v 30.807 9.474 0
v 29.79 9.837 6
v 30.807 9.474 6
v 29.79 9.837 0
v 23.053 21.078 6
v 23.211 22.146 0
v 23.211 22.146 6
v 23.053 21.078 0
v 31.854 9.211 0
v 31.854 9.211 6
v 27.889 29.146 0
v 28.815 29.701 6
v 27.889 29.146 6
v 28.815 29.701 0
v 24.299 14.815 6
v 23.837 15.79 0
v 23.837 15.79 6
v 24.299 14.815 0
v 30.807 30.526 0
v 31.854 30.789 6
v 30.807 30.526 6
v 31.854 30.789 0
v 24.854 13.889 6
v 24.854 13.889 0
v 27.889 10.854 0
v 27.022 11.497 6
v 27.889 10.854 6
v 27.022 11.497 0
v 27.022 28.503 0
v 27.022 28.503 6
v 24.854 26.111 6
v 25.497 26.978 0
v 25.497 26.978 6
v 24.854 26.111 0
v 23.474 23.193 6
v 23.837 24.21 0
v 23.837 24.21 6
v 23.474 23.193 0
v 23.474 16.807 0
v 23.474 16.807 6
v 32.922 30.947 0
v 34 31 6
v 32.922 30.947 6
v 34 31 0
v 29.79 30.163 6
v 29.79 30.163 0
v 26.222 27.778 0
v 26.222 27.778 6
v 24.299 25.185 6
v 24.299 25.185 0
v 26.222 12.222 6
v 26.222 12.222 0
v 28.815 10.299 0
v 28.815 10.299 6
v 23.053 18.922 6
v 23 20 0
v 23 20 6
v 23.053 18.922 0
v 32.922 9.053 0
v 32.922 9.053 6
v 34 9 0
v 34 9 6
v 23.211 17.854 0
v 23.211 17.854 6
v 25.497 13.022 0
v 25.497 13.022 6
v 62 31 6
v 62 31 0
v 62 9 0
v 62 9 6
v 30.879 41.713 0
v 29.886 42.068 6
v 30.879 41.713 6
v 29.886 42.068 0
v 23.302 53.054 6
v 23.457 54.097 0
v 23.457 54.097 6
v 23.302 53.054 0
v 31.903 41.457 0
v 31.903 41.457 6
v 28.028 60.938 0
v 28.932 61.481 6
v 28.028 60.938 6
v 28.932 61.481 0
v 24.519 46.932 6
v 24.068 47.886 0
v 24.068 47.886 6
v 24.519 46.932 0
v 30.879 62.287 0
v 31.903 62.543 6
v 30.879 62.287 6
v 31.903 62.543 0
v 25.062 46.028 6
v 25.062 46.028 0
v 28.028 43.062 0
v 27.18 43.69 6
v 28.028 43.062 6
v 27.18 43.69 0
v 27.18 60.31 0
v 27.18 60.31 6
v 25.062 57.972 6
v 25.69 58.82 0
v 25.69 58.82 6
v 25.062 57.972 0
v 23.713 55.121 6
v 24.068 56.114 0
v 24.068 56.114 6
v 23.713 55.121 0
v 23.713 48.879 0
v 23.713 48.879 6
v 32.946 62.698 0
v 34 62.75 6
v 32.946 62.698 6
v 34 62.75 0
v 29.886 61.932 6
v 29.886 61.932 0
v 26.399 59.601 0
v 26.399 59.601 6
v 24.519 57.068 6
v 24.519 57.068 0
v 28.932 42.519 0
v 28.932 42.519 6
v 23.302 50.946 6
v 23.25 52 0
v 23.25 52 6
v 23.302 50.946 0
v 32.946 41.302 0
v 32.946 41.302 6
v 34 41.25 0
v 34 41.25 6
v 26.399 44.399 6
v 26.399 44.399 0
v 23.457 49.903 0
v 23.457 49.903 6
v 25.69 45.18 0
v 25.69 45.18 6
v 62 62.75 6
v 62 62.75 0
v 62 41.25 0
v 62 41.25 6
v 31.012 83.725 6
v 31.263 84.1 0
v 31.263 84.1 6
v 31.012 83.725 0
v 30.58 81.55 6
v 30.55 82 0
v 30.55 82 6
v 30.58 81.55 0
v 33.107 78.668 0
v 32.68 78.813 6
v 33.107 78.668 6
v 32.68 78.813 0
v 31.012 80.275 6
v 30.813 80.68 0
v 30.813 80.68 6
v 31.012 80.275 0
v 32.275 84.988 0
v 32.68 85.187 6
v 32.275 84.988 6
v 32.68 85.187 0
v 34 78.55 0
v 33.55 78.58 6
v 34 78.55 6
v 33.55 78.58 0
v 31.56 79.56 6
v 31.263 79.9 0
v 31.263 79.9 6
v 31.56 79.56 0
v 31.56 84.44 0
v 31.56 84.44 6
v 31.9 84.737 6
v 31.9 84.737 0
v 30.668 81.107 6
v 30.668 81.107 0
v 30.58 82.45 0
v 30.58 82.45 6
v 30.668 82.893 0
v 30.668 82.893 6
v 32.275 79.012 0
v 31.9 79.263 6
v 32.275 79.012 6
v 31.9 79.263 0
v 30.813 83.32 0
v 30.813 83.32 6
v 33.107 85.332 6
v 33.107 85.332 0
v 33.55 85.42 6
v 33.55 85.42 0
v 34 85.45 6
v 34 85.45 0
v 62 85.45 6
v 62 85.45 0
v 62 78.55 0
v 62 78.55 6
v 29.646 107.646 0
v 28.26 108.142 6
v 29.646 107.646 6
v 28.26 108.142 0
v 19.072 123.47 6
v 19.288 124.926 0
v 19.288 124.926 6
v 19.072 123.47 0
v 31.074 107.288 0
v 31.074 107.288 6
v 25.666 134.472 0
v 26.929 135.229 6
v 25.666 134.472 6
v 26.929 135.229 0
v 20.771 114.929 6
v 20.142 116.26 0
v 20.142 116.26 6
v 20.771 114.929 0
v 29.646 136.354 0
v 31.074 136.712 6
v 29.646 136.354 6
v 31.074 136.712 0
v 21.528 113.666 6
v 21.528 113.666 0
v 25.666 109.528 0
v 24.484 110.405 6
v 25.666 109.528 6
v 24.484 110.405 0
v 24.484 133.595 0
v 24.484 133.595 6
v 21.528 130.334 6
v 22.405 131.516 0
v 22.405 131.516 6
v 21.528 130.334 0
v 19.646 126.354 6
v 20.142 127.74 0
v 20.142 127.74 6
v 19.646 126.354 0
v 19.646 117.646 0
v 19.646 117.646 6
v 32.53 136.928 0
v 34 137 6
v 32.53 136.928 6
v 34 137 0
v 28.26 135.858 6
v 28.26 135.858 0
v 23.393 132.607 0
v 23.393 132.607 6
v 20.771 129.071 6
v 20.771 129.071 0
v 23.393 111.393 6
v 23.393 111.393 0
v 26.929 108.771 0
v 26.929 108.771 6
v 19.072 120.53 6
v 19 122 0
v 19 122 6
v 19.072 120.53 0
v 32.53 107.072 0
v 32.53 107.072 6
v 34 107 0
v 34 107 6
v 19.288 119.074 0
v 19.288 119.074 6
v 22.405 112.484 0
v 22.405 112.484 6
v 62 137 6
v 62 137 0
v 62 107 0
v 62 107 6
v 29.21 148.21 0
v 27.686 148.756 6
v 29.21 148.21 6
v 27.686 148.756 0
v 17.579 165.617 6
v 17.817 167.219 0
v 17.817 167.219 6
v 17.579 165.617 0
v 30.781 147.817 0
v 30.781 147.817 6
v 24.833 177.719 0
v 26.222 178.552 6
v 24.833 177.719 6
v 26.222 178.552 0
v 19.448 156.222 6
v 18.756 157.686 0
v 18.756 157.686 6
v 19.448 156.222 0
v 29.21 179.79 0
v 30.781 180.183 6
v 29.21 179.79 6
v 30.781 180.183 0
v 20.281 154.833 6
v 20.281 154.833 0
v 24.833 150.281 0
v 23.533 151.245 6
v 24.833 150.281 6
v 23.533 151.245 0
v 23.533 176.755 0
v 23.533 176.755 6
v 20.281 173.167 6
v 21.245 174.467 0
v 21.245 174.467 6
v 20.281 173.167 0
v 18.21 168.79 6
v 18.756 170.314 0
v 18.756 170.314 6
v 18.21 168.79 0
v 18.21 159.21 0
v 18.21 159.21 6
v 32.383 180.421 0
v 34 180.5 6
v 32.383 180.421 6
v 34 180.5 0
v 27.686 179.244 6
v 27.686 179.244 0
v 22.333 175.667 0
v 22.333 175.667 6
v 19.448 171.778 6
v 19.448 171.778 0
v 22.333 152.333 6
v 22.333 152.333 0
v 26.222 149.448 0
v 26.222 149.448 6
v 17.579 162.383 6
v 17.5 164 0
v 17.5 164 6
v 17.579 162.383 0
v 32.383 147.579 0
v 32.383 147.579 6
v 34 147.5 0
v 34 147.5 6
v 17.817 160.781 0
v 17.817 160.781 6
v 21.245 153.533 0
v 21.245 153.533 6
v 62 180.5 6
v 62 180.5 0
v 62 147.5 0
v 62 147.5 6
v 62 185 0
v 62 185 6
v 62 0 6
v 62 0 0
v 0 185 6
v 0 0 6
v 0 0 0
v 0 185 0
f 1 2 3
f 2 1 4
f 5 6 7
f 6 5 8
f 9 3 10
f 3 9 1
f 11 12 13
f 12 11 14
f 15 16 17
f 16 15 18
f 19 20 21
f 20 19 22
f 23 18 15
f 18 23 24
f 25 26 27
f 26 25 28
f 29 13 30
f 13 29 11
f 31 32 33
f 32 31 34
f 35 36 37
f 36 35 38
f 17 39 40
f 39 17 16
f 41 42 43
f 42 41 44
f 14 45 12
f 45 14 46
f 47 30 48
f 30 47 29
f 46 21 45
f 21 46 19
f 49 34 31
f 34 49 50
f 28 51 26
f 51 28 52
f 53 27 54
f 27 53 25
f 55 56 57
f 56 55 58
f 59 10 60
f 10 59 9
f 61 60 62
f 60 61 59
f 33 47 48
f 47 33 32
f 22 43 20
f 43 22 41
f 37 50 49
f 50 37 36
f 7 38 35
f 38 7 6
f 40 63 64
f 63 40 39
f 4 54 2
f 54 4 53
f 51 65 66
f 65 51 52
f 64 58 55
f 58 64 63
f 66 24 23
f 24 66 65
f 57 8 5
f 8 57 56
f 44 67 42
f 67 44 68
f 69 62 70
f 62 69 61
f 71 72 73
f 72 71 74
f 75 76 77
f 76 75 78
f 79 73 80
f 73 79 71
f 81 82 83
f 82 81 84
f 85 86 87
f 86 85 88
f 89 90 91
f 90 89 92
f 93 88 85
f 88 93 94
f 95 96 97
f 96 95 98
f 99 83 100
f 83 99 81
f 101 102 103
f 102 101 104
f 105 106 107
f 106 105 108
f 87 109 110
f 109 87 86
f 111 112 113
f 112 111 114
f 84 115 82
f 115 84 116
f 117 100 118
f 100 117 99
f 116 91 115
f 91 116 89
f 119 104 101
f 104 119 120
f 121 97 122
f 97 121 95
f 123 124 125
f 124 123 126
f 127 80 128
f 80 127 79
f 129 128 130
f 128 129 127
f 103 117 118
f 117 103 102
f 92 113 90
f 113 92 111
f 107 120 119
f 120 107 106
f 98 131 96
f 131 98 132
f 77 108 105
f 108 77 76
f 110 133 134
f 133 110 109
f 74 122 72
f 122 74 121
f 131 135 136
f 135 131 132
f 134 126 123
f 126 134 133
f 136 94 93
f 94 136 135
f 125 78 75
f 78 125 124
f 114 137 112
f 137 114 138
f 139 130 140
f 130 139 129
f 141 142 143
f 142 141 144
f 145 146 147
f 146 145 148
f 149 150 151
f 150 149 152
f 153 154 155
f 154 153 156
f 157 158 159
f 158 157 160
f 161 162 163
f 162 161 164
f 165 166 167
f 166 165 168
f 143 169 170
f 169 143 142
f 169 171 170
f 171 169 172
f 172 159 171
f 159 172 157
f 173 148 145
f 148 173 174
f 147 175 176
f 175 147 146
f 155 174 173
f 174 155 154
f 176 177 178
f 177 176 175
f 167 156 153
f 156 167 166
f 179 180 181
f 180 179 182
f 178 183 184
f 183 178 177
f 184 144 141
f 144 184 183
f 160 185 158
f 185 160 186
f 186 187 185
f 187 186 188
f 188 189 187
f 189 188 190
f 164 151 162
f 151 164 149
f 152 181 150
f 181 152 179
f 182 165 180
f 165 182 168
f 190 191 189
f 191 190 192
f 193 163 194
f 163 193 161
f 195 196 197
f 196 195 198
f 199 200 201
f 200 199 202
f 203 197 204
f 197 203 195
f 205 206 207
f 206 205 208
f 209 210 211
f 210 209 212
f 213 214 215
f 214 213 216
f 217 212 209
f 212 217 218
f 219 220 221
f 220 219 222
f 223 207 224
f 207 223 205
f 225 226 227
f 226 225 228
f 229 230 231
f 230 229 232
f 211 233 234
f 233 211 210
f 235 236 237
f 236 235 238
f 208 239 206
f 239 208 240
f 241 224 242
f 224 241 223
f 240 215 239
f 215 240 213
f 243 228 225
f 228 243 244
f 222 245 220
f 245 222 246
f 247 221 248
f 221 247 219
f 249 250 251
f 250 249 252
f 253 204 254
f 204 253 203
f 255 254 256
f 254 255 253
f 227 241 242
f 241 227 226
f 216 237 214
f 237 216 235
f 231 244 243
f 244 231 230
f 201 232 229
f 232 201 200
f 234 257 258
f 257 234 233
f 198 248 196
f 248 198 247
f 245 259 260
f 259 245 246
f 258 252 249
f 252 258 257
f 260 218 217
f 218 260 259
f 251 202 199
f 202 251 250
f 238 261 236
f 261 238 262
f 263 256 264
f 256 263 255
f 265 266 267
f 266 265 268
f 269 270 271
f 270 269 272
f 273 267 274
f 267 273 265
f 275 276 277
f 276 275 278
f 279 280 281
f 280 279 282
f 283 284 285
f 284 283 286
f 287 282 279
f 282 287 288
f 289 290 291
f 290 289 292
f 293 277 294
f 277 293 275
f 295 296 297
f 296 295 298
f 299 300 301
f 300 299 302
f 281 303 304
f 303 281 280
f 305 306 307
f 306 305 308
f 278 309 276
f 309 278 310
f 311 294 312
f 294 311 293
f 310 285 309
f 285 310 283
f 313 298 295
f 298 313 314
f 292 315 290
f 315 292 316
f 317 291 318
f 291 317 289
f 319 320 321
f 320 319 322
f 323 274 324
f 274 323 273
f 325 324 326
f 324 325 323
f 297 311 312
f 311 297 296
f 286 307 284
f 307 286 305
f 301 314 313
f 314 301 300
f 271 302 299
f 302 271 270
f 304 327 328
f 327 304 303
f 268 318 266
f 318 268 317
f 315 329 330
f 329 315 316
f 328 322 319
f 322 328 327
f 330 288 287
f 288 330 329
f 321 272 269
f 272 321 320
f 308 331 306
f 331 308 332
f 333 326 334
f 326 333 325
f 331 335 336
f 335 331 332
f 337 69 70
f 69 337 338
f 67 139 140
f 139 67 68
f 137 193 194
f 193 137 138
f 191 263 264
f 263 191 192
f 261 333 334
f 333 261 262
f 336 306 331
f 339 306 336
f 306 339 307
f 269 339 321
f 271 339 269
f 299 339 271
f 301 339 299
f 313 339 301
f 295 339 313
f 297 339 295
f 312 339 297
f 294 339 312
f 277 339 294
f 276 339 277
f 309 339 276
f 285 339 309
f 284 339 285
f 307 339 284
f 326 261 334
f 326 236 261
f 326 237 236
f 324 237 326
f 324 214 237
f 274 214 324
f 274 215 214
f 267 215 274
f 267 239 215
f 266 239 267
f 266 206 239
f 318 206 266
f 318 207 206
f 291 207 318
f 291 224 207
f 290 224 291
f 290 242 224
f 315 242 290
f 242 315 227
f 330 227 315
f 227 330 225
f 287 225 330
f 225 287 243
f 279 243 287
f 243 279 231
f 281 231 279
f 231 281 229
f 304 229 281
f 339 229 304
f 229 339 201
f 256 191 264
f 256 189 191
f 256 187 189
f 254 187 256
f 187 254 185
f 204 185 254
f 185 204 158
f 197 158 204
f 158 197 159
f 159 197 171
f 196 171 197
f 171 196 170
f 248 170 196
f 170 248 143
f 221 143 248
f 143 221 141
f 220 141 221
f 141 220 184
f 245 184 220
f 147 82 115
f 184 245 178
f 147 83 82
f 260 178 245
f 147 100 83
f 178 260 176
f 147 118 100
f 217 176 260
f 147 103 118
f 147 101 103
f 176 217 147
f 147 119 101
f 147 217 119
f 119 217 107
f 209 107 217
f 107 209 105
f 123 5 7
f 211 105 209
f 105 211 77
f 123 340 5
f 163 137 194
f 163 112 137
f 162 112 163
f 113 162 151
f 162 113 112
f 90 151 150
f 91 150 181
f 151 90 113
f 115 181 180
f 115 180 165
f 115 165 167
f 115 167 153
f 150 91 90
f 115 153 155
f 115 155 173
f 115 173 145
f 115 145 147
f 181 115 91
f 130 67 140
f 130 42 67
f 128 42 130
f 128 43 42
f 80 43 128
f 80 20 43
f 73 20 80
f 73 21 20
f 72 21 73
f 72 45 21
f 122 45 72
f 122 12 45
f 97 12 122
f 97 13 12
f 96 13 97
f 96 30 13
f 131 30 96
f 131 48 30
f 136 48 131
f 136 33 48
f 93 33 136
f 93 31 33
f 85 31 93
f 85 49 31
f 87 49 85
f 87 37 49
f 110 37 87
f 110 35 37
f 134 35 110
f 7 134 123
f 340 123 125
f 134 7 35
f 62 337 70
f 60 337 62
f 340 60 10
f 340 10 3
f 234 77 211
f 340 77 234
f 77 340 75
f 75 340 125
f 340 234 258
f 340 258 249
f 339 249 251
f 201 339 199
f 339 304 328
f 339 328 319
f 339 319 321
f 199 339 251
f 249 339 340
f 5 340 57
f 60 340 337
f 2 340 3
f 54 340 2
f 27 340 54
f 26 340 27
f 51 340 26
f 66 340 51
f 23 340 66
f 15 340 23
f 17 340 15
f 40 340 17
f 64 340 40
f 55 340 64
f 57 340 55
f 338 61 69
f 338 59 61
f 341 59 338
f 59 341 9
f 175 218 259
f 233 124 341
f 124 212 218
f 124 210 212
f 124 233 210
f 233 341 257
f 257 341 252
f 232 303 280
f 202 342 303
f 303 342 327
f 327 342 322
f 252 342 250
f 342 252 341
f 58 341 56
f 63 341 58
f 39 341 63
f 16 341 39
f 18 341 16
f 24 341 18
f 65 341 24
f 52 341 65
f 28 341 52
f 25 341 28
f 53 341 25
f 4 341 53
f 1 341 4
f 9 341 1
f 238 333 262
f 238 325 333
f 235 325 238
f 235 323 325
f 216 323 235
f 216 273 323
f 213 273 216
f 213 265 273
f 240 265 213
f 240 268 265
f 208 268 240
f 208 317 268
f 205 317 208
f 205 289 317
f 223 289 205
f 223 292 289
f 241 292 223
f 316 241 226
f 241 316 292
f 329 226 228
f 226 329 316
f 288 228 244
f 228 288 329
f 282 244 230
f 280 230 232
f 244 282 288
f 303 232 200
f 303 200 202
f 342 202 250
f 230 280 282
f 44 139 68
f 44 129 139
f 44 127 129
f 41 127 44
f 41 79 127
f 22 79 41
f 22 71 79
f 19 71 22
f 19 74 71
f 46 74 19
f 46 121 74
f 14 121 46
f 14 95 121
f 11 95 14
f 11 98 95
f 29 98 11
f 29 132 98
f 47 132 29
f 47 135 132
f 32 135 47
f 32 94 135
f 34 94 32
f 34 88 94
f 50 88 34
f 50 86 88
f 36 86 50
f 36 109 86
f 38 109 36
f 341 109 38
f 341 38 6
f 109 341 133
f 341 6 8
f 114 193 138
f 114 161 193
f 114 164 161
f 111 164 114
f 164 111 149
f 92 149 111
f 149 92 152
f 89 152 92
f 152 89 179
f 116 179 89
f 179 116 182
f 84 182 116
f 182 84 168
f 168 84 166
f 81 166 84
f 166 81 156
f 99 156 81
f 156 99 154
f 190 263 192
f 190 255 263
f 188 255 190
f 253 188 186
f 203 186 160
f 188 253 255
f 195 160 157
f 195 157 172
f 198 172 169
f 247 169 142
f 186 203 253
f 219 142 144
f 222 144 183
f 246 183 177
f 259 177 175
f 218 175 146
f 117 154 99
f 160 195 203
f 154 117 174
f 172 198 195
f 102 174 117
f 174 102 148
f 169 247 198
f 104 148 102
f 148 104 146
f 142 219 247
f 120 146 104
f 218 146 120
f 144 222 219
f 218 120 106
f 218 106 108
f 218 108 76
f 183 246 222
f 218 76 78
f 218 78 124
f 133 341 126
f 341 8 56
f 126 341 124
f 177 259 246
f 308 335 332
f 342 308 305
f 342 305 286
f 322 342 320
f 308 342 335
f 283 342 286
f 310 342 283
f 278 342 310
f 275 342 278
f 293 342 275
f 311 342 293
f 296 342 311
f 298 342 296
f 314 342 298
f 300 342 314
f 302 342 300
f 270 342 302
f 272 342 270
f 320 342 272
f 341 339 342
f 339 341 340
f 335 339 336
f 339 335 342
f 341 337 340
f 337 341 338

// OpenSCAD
// file: ../src/mount.scad
/*
  Reusable pegboard mount geometry.
  Units: mm.

  Mechanical architecture:
    - curved upper retaining hooks
    - straight lower locating pegs one grid row below

  The current geometry is based on physical testing plus a known-working
  PEGSTR-derived reference. See docs/THIRD_PARTY.md before redistributing or
  relicensing derived geometry.
*/

module pegboard_pin(
    clip=false,
    peg_d=5.5,
    board_geom=5.0,
    neck_length=0.5,
    epsilon=0.1
) {
    clip_height = 2 * peg_d + 2;

    rotate([0,0,15])
        cylinder(
            r = peg_d / 2,
            h = clip ? neck_length : board_geom * 1.5 + epsilon,
            center = true,
            $fn = 12
        );

    if (clip) {
        rotate([0,0,90])
        intersection() {
            translate([0, 0, peg_d - epsilon])
                cube(
                    [peg_d + 2*epsilon, clip_height, 2*peg_d],
                    center = true
                );

            translate([0, peg_d/2 + 2, board_geom/2])
                rotate([0,90,0])
                rotate_extrude(convexity = 5, $fn = 20)
                    translate([5.5,0,0])
                        circle(r = (peg_d * 0.95) / 2, $fn = 20);

            translate([0, peg_d/2 + 0.5, board_geom/2])
                rotate([45,0,0])
                translate([0,0,peg_d * 0.6])
                    cube(
                        [peg_d + 2*epsilon, 3*peg_d, peg_d],
                        center = true
                    );
        }
    }
}


module pegboard_mount_pins(
    columns=2,
    pitch=25.4,
    peg_d=5.5,
    board_geom=5.0,
    hook_offset=4.5,
    neck_length=0.5,
    epsilon=0.1
) {
    width = (columns - 1) * pitch;

    rotate([0,90,0]) {
        for (i = [0:columns-1]) {
            column = -width/2 + i*pitch;

            translate([0, column, -hook_offset])
                pegboard_pin(
                    clip=true,
                    peg_d=peg_d,
                    board_geom=board_geom,
                    neck_length=neck_length,
                    epsilon=epsilon
                );

            translate([pitch, column, 0])
                pegboard_pin(
                    clip=false,
                    peg_d=peg_d,
                    board_geom=board_geom,
                    neck_length=neck_length,
                    epsilon=epsilon
                );
        }
    }
}


module pegboard_mount_plate(
    columns=2,
    pitch=25.4,
    peg_d=5.5,
    board_geom=5.0,
    neck_length=0.5,
    base_wall_thickness=1.85,
    root_clearance=0.20,
    epsilon=0.1
) {
    width = (columns - 1) * pitch;
    clip_height = 2 * peg_d + 2;
    root_cover = neck_length + root_clearance;
    plate_thickness = base_wall_thickness + root_cover;

    rotate([0,90,0])
    translate([
        -epsilon,
        0,
        -plate_thickness - board_geom/2 + epsilon
    ])
    hull() {
        for (i = [0:columns-1]) {
            column = -width/2 + i*pitch;

            translate([
                -clip_height/2 + peg_d/2,
                column,
                0
            ])
                cylinder(r=peg_d/2, h=plate_thickness, $fn=32);

            translate([
                pitch,
                column,
                0
            ])
                cylinder(r=peg_d/2, h=plate_thickness, $fn=32);
        }
    }
}


module pegboard_mount(
    columns=2,
    pitch=25.4,
    peg_d=5.5,
    board_geom=5.0,
    hook_offset=4.5,
    neck_length=0.5,
    base_wall_thickness=1.85,
    root_clearance=0.20,
    epsilon=0.1,
    include_plate=true
) {
    union() {
        if (include_plate)
            pegboard_mount_plate(
                columns=columns,
                pitch=pitch,
                peg_d=peg_d,
                board_geom=board_geom,
                neck_length=neck_length,
                base_wall_thickness=base_wall_thickness,
                root_clearance=root_clearance,
                epsilon=epsilon
            );

        pegboard_mount_pins(
            columns=columns,
            pitch=pitch,
            peg_d=peg_d,
            board_geom=board_geom,
            hook_offset=hook_offset,
            neck_length=neck_length,
            epsilon=epsilon
        );
    }
}
// main file
use <../src/driver_station.scad>

// All-driver U-slot comparison coupon.
// Print flat at 100% scale.
//
// Slot order:
//   22.0 mm  large Phillips
//   21.5 mm  large flat-blade
//    6.9 mm  small flat-blade
//   30.0 mm  full-size ratchet
//   33.0 mm  Stanley stubby
driver_station_u_slot_coupon();
